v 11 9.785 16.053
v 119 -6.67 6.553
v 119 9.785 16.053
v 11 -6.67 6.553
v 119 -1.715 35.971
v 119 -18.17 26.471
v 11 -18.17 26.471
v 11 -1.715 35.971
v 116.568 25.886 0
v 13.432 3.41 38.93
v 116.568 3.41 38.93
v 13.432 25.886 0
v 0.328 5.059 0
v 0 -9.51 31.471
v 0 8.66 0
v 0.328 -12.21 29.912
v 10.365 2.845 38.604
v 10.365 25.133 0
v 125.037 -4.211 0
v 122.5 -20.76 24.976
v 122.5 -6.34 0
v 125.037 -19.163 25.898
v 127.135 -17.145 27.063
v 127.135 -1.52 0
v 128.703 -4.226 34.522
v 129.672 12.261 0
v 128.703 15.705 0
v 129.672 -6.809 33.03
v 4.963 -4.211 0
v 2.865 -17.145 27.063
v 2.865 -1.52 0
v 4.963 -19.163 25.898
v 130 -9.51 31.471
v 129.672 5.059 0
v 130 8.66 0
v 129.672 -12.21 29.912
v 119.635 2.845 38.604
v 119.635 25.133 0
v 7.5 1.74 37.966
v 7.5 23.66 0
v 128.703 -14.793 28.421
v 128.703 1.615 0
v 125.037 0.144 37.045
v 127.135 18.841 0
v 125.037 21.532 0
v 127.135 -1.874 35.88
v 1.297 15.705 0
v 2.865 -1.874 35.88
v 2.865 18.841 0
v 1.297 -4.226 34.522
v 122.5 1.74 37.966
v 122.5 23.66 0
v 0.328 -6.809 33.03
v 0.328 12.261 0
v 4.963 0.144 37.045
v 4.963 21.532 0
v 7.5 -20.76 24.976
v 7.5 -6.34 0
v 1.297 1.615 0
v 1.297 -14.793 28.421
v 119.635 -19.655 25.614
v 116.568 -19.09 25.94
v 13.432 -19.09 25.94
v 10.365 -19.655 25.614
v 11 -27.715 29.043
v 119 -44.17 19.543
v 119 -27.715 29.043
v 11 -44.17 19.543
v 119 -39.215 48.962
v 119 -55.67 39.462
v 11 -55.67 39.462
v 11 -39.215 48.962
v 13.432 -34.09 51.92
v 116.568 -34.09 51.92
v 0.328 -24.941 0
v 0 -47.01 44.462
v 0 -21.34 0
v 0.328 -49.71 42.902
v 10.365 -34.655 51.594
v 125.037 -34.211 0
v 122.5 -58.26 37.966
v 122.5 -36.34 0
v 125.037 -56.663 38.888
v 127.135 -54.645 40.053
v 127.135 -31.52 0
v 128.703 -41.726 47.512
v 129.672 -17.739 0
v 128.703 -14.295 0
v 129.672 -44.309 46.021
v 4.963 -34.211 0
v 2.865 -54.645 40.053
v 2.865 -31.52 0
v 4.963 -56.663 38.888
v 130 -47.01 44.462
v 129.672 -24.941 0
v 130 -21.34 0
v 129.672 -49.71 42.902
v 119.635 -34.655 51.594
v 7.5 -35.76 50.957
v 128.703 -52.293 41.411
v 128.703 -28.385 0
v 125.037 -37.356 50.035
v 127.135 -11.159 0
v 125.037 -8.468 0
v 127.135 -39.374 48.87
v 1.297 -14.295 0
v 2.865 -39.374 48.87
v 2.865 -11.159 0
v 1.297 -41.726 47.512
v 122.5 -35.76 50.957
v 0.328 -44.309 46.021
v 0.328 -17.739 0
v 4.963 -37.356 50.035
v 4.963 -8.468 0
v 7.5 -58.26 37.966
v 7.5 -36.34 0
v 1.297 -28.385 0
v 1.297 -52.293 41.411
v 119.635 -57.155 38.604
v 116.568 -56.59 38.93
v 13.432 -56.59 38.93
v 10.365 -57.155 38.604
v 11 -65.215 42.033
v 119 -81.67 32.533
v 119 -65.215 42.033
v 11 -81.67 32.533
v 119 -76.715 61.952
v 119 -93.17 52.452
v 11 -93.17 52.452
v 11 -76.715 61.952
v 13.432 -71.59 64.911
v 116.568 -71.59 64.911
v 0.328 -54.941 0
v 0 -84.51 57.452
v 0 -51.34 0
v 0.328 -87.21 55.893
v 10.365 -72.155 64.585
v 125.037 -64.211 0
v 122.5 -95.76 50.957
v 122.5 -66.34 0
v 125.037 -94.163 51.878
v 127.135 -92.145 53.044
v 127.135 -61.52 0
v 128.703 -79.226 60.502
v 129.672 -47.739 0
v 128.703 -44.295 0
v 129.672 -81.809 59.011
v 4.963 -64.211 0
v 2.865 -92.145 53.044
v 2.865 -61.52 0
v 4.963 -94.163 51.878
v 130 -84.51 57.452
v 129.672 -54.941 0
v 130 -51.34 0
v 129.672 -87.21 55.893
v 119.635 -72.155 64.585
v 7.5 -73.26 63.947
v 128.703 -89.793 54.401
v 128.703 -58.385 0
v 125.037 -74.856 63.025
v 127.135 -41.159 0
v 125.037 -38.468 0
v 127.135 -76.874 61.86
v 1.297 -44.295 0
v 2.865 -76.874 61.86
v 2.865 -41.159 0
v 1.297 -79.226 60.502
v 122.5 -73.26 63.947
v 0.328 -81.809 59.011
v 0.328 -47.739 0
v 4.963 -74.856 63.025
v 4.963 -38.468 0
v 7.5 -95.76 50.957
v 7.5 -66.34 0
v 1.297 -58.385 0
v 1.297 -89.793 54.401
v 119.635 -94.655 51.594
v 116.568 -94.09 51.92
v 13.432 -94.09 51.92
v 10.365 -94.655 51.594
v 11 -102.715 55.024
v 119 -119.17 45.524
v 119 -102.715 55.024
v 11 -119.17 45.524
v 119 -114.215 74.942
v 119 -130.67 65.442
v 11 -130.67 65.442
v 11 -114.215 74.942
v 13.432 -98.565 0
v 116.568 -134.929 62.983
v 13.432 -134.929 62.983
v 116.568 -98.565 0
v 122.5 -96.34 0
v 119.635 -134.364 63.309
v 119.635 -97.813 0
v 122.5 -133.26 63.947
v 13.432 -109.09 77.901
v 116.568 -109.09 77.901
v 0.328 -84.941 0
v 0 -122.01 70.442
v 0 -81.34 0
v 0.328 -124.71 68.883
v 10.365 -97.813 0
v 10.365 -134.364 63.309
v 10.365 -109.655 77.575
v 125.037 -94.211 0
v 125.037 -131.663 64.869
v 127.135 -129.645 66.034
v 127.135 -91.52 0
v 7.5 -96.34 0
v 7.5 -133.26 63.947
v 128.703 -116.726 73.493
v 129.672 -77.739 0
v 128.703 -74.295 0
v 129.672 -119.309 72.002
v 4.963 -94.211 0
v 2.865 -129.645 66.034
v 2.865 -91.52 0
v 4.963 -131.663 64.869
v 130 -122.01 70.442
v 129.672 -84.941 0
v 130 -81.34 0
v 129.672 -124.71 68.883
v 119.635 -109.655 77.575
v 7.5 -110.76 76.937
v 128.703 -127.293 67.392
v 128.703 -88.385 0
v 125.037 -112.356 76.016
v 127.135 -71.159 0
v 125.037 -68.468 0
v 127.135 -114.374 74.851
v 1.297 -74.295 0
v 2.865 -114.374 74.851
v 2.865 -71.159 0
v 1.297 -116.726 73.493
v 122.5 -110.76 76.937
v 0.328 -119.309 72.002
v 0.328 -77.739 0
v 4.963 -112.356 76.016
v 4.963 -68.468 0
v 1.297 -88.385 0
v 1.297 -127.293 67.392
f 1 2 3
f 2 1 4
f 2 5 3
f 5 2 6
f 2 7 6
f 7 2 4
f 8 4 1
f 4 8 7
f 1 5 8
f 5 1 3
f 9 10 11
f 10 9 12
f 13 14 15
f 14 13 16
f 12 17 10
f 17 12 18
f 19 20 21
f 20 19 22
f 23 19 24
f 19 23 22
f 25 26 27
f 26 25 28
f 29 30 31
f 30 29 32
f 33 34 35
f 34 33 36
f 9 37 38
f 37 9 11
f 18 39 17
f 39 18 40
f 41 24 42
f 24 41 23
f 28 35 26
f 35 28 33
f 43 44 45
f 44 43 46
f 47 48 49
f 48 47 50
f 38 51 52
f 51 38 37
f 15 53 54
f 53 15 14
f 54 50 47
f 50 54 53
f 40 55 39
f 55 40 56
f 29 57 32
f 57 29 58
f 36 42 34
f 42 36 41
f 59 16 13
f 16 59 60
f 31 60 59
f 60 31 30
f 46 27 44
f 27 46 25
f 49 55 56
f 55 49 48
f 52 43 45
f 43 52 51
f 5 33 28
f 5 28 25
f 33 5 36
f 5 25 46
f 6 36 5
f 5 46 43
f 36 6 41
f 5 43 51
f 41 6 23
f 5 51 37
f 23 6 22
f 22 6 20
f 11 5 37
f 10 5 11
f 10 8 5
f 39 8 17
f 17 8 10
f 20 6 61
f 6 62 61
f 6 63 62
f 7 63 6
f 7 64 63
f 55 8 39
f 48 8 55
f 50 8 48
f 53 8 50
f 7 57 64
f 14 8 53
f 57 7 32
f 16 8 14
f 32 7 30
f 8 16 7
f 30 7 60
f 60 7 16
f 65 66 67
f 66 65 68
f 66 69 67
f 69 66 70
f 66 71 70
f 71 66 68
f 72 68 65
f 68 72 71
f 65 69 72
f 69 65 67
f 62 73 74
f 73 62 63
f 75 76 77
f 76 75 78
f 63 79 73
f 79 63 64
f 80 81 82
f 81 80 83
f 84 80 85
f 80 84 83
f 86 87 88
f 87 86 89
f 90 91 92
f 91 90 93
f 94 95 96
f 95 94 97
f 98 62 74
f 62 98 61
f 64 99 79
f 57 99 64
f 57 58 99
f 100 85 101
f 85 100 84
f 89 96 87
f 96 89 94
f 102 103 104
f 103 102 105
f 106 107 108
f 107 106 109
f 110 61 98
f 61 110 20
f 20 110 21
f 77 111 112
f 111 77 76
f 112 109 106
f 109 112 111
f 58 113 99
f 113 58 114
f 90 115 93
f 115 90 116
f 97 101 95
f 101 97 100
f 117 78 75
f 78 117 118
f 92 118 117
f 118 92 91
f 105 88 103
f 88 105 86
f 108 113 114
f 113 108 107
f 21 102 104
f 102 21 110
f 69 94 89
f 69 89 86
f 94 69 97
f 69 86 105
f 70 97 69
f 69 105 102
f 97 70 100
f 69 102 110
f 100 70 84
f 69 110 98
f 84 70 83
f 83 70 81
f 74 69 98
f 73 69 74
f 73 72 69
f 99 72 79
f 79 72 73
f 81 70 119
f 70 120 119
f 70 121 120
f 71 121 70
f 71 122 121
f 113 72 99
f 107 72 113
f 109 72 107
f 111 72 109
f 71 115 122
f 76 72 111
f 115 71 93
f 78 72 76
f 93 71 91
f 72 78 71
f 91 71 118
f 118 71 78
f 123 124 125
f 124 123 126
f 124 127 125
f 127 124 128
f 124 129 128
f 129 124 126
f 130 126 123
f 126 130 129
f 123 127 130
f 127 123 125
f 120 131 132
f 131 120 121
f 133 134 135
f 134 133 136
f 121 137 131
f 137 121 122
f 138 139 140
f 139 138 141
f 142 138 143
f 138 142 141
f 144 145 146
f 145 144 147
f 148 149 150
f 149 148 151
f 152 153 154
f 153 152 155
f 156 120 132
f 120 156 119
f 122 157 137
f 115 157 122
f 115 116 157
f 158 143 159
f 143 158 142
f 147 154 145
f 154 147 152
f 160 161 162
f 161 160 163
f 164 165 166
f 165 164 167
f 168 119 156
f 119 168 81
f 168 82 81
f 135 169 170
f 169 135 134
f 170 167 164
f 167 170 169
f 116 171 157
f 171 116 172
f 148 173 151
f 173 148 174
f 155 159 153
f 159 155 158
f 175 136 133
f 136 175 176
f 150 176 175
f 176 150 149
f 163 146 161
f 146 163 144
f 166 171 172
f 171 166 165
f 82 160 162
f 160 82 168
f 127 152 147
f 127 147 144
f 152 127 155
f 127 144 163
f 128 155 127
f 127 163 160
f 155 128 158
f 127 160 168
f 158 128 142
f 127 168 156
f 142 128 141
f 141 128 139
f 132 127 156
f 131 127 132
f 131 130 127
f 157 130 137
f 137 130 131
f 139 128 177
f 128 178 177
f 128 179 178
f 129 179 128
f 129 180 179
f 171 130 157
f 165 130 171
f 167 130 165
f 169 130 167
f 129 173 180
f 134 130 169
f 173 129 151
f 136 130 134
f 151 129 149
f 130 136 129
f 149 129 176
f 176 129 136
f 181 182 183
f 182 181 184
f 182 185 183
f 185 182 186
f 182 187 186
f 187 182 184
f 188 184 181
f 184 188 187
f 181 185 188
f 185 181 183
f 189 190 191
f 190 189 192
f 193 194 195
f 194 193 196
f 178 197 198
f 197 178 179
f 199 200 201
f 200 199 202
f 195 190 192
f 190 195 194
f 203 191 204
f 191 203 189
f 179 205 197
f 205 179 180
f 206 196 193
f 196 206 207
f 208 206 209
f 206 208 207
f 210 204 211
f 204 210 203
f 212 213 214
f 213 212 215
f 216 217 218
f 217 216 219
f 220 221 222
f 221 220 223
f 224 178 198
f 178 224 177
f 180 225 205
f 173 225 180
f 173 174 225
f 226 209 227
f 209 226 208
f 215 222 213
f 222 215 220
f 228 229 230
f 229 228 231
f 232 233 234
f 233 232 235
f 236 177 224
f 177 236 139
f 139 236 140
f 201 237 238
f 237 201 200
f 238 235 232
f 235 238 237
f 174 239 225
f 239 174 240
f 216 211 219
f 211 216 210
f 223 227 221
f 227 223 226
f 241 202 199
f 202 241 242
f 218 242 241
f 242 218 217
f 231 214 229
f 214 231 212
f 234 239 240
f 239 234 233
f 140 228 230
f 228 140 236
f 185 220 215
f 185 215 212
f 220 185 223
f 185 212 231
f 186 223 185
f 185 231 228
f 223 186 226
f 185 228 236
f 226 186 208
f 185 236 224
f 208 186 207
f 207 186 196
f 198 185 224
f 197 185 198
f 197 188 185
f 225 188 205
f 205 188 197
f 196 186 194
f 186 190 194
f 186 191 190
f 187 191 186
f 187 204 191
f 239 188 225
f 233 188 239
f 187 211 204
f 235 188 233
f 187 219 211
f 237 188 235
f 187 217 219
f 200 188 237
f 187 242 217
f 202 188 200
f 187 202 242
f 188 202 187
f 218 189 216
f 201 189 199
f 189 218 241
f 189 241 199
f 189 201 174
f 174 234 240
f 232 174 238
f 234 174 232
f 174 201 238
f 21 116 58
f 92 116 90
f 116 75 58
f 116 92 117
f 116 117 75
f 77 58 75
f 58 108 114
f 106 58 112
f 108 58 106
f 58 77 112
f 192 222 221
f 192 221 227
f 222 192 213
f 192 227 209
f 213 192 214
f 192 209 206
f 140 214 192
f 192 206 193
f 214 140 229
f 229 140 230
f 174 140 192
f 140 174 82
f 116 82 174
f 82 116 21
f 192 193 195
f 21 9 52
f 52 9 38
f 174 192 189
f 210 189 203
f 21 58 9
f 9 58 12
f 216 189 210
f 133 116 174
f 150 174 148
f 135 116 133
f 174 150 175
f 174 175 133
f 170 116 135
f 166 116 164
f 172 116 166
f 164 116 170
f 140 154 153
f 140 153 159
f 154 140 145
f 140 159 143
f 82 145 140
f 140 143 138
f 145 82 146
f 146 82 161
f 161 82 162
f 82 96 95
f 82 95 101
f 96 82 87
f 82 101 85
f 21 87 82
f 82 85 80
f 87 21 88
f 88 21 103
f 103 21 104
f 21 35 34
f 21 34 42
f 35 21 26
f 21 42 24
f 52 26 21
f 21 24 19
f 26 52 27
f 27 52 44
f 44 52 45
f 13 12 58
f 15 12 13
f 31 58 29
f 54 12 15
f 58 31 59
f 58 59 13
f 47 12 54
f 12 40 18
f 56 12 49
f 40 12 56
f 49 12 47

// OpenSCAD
//Amount of cart slots
cart_count = 4; //[1:1:8]
//Cart type
cart_type = 5; //[0:Snes PAL, 1:Snes NTSC, 2:N64, 3:Gameboy/GBA, 4:DS/3DS, 5:NES]
//Support leg length (mm);
support_legs_length = 0; //[0:1:100]

module cart_cup(cup_height, cup_width, cup_depth, cart_hole_depth, support_legs_length, cup_angle) {
    
    difference() {
        
        union() {
            translate([0,cup_depth/2,0])
            hull() {
                translate([cup_depth/2,0,0])
                cylinder(h=cup_height, d=cup_depth);
                
                translate([cup_width-cup_depth/2,0,0])
                cylinder(h=cup_height, d=cup_depth);
            }
            
            
            for(j = [cup_width/4, cup_width*3/4]) {
            
                translate([j - 10/2, -(support_legs_length*cos(cup_angle)), 
                                                cup_depth*sin(cup_angle)])
                cube([10,   support_legs_length*cos(cup_angle),
                            support_legs_length*sin(cup_angle)]);
            }

        }
        translate([cup_width/2,0,cup_height-cart_hole_depth])
        children();
    }
}
    
module nescart() {
    translate([-108/2,5,0])
    linear_extrude(24)
    polygon([[0,0],[108,0],
            [108,19],[0,19]]);
    
    translate([-122/2,5,24])
    linear_extrude(110)
    polygon([[0,0],[122,0],
            [122,19],[0,19]]);
    
};
    
module snescart_pal() {
    translate([-130/2,5,0])
    linear_extrude(88)
    polygon([[0,0],[130,0],
            [130,10],[127,16],[120,18],[100,20],[70,22],
            [60,22],[30,20],[10,18],[3,16],[0,10]]);
    
};


module snescart_ntsc() {
    translate([-130/2,5,0])
    linear_extrude(88)
    polygon([
        [-4,0],[-4,19],[17,19],[17,22],
        [113,22],[113,19],[134,19],[134,0]    
    ]);
    
};

module gameboycart() {
    translate([-58/2,3,0])
    linear_extrude(65)
    polygon([[0,0],[58,0],
            [58,8],[0,8]]);
    
};

module dscart() {
    translate([-34/2,3,0])
    linear_extrude(35)
    polygon([[0,0],[34,0],
            [34,4.5],[0,4.5]]);
    
};

module n64cart() {
    translate([-118/2,5,0])
    linear_extrude(76)
    polygon([[0,0],[0,9],[1,13],[2,15],[3,16],[6,18],[9,19],
            [118-9,19],[118-6,18],[118-3,16],[118-2,15],[118-1,13],[118,9],[118,0]]);
    
};

module cart_stand(  amount_of_carts, delta_y, delta_h, angle,
                    cup_height, cup_width, cup_depth, cart_hole_depth, support_legs_length) {

    cut_from_bottom = sin(angle)*cup_depth;
                        
    difference() {
        union() {
            
            for(i = [0:amount_of_carts-1]) {
                translate([0, -i*delta_y, -cut_from_bottom])
                rotate([angle, 0, 0]) 
                    if (i==(amount_of_carts-1))
                        cart_cup(   cup_height + i*delta_h, cup_width, cup_depth,  
                                    cart_hole_depth, support_legs_length,                                                 angle) 
                        #children();
                    else
                        cart_cup(   cup_height + i*delta_h, cup_width, cup_depth,  
                                   cart_hole_depth, 0, 0)
                        #children();
                    
                    
                
            }
        }
        //ground
        translate([0, -delta_y*amount_of_carts - support_legs_length, -cut_from_bottom - support_legs_length])
        cube([cup_width, delta_y*(amount_of_carts+1) + support_legs_length, cut_from_bottom + support_legs_length]);
    }
}

//cart_stand(  amount_of_carts, delta_y, delta_h, angle,
//             cup_height, cup_width, cup_depth, cart_hole_depth, support_legs_length)

//cart_type: [0:Snes PAL, 1:Snes NTSC, 2:N64, 3:Gameboy/GBA, 4:DS/3DS]

if (cart_type == 0) {
    cart_stand(cart_count, 30, 15, 30, 30, 150, 30, 15, support_legs_length) snescart_pal();
}
if (cart_type == 1) {
    cart_stand(cart_count, 30, 15, 30, 30, 150, 30, 15, support_legs_length) snescart_ntsc();
}
if (cart_type == 2) {
    cart_stand(cart_count, 26, 15, 30, 30, 130, 26, 15, support_legs_length) n64cart();
}
if (cart_type == 3) {
    cart_stand(cart_count, 14, 8, 30, 15, 68, 14, 6, support_legs_length) gameboycart();
}
if (cart_type == 4) {
    cart_stand(cart_count, 9, 5, 30, 12, 40, 10, 6, support_legs_length) dscart();
}
if (cart_type == 5) {
    cart_stand(cart_count, 30, 15, 30, 45, 130, 30, 23, support_legs_length) nescart();
}
